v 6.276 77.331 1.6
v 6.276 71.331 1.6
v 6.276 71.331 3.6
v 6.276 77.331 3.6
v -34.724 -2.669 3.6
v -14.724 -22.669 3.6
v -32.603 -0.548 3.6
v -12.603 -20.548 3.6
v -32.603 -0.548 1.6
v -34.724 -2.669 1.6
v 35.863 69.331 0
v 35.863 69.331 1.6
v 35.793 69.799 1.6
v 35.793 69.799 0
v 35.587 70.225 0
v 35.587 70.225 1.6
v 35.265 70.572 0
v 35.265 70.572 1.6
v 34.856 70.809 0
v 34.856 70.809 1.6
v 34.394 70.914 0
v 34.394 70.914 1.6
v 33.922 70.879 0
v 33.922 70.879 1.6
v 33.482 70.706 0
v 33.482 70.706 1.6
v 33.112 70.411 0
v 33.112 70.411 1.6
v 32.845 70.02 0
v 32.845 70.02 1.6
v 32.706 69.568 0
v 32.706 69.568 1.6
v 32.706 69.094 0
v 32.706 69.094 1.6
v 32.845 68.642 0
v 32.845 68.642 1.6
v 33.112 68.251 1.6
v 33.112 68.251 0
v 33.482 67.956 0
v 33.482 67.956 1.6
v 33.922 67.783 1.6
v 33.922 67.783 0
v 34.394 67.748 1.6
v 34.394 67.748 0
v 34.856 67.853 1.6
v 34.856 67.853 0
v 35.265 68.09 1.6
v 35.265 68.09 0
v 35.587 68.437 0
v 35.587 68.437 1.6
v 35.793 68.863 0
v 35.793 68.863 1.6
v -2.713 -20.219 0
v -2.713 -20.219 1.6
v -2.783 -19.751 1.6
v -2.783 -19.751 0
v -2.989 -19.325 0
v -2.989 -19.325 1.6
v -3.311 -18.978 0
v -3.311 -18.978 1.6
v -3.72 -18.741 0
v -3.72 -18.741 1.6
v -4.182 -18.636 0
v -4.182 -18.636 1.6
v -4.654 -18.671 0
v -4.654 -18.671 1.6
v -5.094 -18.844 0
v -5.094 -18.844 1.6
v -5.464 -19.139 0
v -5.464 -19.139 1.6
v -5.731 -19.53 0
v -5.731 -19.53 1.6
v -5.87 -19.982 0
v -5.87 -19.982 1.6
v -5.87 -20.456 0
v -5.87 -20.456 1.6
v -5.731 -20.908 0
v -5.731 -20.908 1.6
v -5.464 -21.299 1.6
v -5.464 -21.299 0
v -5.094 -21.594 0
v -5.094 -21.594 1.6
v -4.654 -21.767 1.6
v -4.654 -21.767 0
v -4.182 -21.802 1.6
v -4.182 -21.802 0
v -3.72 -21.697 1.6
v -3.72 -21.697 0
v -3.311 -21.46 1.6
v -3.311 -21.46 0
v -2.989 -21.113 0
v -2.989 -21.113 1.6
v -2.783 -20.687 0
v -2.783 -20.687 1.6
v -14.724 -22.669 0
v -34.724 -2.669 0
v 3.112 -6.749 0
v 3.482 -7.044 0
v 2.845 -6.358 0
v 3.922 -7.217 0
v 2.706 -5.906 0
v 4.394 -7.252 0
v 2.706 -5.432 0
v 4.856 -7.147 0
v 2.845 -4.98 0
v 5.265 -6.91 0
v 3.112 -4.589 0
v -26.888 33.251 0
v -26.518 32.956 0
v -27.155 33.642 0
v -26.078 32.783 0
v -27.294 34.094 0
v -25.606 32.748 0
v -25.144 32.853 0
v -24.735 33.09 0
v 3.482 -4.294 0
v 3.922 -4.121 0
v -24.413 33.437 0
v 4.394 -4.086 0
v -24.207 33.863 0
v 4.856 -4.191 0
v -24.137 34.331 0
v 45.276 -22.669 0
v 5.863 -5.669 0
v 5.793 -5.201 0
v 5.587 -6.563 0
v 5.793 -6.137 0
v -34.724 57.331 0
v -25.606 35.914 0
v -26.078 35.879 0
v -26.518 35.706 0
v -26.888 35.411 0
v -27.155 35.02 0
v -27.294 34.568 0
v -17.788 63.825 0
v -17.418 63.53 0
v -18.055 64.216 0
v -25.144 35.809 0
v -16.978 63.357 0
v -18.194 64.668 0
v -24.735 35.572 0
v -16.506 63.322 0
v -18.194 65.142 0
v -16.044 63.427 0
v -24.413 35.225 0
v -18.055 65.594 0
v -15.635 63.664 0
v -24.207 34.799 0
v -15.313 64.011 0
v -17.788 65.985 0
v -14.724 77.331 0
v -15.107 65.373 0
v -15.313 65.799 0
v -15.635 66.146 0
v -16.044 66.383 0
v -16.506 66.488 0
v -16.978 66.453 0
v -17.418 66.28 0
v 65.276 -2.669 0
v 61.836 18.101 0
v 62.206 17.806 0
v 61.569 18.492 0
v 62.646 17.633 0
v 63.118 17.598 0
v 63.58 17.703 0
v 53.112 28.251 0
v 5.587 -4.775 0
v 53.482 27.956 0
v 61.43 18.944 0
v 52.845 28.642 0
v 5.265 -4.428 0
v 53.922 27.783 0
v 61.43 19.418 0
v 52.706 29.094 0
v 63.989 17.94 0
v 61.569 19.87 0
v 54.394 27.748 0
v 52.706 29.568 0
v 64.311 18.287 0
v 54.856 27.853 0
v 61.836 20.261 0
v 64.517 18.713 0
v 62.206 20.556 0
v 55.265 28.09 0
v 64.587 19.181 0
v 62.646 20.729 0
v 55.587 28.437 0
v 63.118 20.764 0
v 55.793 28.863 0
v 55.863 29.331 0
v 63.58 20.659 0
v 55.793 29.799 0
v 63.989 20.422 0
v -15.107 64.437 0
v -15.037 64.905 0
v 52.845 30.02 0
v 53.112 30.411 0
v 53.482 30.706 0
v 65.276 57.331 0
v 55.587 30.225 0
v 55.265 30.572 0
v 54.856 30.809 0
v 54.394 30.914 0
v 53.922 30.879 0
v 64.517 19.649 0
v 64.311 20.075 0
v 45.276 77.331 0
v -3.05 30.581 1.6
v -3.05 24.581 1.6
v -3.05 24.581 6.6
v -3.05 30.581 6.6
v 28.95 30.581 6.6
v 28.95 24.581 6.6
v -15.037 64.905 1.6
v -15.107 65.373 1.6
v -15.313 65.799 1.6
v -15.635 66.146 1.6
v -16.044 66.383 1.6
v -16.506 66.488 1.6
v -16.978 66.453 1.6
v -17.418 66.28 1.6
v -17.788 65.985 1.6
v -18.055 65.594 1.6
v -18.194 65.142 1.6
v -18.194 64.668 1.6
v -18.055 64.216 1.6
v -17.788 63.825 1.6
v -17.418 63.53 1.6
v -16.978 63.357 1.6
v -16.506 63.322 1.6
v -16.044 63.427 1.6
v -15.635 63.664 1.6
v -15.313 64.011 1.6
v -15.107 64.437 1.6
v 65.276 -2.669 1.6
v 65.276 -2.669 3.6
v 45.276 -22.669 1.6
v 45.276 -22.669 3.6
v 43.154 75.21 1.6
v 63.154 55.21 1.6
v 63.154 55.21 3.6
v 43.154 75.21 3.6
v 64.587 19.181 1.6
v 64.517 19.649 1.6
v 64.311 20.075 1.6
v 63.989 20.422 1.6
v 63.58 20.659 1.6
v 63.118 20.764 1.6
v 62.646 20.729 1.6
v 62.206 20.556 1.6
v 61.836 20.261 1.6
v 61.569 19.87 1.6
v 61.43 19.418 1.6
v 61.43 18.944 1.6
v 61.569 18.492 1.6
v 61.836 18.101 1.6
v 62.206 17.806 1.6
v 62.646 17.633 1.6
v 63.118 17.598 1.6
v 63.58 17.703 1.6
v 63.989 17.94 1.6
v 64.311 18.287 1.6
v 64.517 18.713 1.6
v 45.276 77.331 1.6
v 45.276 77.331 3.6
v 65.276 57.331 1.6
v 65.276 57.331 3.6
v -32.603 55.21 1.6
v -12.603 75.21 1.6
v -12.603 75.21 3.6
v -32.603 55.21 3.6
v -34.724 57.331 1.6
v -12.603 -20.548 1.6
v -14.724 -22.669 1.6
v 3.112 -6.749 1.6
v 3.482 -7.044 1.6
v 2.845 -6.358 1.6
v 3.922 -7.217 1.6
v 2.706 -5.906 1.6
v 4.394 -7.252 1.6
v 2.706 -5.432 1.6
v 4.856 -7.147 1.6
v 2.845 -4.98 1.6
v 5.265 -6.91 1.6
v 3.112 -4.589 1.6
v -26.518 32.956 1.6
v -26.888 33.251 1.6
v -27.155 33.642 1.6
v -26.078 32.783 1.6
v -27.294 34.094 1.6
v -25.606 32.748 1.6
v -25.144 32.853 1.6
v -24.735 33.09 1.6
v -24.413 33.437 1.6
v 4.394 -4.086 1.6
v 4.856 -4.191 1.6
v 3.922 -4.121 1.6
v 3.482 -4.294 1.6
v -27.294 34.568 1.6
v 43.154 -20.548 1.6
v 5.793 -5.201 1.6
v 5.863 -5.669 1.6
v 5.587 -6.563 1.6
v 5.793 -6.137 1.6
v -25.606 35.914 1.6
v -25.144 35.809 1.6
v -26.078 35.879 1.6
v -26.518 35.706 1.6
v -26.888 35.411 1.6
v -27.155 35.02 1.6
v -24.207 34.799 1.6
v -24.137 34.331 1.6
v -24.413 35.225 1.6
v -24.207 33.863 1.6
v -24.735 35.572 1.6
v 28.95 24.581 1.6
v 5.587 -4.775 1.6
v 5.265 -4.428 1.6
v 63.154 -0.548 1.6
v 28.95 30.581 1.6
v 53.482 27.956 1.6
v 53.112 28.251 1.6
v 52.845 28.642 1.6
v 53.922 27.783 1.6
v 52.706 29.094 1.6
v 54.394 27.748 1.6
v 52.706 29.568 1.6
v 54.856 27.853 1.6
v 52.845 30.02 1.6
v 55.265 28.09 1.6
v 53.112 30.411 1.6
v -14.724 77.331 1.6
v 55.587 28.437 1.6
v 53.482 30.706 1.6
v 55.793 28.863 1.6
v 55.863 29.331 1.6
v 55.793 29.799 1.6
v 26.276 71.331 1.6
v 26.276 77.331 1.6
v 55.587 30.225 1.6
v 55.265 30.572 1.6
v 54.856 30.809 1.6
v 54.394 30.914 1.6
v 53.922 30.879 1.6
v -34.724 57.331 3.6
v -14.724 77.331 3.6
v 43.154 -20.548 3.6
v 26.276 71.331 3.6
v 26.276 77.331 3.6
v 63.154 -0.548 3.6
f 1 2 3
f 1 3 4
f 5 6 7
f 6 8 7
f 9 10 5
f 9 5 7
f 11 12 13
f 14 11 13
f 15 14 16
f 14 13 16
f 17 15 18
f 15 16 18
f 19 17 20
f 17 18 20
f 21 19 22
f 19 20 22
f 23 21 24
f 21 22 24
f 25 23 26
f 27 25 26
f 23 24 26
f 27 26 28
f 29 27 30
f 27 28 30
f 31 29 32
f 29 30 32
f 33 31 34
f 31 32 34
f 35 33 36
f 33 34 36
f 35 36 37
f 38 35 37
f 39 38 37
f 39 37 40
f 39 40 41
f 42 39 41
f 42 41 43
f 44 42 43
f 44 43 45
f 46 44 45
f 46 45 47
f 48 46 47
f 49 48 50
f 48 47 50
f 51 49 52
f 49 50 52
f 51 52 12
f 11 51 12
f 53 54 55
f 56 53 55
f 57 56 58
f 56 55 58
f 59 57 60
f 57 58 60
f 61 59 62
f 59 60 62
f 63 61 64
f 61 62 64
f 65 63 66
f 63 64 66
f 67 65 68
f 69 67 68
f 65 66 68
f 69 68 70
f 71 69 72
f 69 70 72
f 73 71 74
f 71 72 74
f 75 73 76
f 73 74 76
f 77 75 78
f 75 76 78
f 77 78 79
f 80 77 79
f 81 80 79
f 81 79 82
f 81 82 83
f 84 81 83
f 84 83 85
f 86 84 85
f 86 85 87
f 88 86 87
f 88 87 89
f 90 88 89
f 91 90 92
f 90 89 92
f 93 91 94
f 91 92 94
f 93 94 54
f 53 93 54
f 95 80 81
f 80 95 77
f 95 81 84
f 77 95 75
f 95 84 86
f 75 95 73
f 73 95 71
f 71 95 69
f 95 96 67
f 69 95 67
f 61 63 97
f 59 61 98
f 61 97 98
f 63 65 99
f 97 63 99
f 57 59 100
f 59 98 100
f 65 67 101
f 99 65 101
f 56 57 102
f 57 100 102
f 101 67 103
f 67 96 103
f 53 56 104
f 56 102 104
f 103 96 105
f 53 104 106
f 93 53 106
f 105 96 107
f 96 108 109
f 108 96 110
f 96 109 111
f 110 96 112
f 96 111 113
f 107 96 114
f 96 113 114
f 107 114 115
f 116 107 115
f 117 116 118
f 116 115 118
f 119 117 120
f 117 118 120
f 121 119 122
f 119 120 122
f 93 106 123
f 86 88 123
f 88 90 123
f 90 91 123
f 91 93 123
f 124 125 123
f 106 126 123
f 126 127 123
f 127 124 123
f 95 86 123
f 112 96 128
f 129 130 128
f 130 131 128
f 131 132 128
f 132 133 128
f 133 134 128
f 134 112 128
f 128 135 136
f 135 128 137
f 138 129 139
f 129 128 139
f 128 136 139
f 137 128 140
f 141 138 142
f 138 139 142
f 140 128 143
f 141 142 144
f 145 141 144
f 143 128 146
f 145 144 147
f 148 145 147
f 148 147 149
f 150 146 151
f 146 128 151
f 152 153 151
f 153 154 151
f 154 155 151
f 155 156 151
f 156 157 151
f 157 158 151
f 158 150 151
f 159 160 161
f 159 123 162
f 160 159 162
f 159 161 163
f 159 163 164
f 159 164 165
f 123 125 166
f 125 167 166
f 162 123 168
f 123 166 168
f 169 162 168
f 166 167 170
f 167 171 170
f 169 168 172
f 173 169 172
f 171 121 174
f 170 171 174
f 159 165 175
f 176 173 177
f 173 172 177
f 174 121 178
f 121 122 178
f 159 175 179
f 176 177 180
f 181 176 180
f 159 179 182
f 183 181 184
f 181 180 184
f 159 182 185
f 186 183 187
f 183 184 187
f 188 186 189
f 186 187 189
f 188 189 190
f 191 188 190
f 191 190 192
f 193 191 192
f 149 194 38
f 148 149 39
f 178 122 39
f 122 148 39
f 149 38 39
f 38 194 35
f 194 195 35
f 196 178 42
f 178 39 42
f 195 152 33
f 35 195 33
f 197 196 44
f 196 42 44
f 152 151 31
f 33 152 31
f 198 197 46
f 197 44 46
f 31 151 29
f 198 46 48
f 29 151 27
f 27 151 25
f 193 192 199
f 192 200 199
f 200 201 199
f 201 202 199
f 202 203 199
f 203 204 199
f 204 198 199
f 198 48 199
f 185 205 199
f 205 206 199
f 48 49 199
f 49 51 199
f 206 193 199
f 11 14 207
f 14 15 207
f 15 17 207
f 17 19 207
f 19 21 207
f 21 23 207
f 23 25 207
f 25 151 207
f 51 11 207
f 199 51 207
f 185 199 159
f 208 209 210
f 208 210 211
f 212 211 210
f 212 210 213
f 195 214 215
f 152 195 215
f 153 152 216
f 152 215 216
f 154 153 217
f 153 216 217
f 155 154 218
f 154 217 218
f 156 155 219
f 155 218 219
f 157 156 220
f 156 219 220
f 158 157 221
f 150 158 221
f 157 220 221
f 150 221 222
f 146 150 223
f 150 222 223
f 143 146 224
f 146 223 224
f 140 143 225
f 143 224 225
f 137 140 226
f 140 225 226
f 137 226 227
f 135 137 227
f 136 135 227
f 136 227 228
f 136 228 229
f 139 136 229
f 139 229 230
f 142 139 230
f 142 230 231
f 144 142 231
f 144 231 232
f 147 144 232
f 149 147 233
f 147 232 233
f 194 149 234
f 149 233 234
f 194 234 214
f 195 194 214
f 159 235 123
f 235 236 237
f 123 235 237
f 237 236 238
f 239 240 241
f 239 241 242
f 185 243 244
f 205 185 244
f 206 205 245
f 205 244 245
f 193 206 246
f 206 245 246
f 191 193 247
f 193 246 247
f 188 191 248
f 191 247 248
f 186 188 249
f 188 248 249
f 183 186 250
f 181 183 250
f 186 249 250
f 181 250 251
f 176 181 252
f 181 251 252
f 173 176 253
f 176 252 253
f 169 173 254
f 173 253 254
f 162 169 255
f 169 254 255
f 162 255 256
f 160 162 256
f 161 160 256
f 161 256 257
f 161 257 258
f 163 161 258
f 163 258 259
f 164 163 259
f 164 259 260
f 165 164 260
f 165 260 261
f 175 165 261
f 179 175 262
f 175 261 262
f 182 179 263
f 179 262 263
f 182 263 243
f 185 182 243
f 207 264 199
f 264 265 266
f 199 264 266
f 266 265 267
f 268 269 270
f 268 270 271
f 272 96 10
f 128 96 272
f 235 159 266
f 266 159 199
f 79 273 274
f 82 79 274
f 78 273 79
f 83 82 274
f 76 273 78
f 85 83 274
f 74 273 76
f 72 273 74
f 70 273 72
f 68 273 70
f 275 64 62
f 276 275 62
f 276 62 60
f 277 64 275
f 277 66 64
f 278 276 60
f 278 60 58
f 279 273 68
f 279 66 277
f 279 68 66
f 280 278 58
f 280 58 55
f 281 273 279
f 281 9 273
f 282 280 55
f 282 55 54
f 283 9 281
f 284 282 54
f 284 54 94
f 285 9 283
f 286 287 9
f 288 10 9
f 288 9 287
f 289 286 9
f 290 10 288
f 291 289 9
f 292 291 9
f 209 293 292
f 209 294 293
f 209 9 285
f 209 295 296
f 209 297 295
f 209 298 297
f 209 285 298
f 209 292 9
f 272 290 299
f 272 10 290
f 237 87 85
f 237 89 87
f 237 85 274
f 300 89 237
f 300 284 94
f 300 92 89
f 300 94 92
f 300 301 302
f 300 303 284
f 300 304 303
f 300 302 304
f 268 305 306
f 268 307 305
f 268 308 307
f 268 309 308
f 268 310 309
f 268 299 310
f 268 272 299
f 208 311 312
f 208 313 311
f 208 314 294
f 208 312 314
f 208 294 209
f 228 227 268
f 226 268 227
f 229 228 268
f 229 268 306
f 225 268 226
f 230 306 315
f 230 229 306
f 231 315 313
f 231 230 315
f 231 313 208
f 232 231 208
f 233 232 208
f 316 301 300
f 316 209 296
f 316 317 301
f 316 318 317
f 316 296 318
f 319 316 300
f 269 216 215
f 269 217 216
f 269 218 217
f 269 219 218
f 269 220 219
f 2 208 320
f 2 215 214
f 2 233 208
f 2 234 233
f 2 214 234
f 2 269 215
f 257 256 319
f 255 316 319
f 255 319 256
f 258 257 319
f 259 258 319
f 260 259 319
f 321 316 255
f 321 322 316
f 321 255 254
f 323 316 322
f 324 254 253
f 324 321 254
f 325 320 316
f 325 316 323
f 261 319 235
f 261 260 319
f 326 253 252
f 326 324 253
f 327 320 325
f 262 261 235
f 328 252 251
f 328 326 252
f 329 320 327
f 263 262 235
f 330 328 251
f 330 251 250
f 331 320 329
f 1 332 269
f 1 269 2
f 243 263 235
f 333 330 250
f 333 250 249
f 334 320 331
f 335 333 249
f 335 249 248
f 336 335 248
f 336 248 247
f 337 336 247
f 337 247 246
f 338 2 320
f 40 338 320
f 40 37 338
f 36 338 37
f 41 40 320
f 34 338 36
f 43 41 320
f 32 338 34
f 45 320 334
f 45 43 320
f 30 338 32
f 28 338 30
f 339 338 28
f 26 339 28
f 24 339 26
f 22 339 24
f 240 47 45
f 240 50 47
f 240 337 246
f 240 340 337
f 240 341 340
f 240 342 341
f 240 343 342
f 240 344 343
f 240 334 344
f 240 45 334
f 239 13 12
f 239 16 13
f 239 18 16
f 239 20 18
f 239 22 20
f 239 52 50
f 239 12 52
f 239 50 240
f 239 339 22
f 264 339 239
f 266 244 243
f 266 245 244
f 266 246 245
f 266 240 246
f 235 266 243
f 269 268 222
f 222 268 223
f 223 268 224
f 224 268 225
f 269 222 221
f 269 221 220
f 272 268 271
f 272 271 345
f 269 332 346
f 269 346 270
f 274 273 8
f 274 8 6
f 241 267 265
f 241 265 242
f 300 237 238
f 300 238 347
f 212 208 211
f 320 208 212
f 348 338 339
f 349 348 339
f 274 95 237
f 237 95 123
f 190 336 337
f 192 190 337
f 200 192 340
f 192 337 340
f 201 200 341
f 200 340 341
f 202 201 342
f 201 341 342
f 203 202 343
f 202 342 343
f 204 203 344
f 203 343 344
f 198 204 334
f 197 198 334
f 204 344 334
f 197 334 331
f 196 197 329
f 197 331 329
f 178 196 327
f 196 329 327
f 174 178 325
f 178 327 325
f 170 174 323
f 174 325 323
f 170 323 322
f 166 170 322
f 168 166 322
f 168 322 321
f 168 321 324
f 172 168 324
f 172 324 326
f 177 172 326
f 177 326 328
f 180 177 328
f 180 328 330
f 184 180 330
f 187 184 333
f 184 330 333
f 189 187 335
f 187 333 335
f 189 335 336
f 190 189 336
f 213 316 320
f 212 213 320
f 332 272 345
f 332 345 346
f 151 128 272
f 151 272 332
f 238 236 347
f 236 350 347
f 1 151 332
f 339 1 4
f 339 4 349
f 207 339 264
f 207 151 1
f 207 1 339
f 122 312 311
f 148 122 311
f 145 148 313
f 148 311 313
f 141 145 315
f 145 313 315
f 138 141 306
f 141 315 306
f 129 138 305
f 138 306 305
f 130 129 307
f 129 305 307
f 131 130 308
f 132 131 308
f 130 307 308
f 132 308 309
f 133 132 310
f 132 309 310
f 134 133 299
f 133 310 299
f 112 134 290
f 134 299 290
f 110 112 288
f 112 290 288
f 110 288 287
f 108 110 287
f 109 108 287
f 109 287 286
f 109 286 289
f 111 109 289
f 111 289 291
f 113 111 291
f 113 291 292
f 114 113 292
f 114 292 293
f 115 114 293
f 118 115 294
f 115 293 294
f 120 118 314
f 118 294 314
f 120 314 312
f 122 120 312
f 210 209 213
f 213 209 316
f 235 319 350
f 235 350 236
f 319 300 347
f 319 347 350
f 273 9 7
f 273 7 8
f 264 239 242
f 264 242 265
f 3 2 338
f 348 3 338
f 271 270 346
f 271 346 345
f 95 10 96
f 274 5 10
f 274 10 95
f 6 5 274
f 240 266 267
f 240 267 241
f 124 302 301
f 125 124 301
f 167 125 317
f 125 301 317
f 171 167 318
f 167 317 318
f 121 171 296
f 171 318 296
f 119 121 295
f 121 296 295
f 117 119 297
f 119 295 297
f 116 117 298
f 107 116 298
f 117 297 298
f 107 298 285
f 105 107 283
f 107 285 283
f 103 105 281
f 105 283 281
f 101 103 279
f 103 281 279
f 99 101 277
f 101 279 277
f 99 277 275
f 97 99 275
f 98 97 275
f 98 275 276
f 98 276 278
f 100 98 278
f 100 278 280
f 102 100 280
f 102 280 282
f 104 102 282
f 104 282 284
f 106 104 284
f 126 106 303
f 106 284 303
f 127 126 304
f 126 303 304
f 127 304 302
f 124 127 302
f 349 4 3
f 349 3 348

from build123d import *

# Parameters (mm, degrees)
SKETCH1_W           = 100
SKETCH1_H           = 100
BOSS_EXTRUDE1_DEPTH = 1.6
CUT_EXTRUDE1_DEPTH  = 1.6
SKETCH7_R           = 1.5875
CUT_EXTRUDE2_DEPTH  = 1.6
SKETCH8_W           = 32
SKETCH8_H           = 6
BOSS_EXTRUDE2_DEPTH = 5
BOSS_EXTRUDE3_DEPTH = 2
SKETCH12_W          = 20
SKETCH12_H          = 6
BOSS_EXTRUDE5_DEPTH = 2


with BuildPart() as part:
    # Sketch1 → Boss-Extrude1 (new body)
    with BuildSketch(Plane.XY):
        with Locations((15.275668243, 27.330907947)):
            Rectangle(SKETCH1_W, SKETCH1_H)
    extrude(amount=BOSS_EXTRUDE1_DEPTH)

    # Sketch2 → Cut-Extrude1 (cut)
    with BuildSketch(Plane.XY.offset(1.6)):
        Polygon((-34.724331757, 57.330907947), (-14.724331757, 77.330907947), (-34.724331757, 77.330907947), align=None)
        Polygon((-34.724331757, -2.669092053), (-14.724331757, -22.669092053), (-34.724331757, -22.669092053), align=None)
        Polygon((45.275668243, 77.330907947), (65.275668243, 57.330907947), (65.275668243, 77.330907947), align=None)
        Polygon((65.275668243, -2.669092053), (45.275668243, -22.669092053), (65.275668243, -22.669092053), align=None)
    extrude(amount=-CUT_EXTRUDE1_DEPTH, mode=Mode.SUBTRACT)

    # Sketch7 → Cut-Extrude2 (cut)
    with BuildSketch(Plane.XY.offset(1.6)):
        with Locations((-25.724331757, 34.330907947)):
            Circle(SKETCH7_R)
        with Locations((-16.624331757, 64.904907947)):
            Circle(SKETCH7_R)
        with Locations((34.275668243, 69.330907947)):
            Circle(SKETCH7_R)
        with Locations((54.275668243, 29.330907947)):
            Circle(SKETCH7_R)
        with Locations((62.999668243, 19.180907947)):
            Circle(SKETCH7_R)
        with Locations((-4.300331757, -20.219092053)):
            Circle(SKETCH7_R)
        with Locations((4.275668243, -5.669092053)):
            Circle(SKETCH7_R)
    extrude(amount=-CUT_EXTRUDE2_DEPTH, mode=Mode.SUBTRACT)

    # Sketch8 → Boss-Extrude2 (add)
    with BuildSketch(Plane.XY.offset(1.6)):
        with Locations((12.949668243, 27.580907947)):
            Rectangle(SKETCH8_W, SKETCH8_H)
    extrude(amount=BOSS_EXTRUDE2_DEPTH)

    # Sketch10 → Boss-Extrude3 (add)
    with BuildSketch(Plane.XY.offset(1.6)):
        Polygon((-34.724331757, 57.330907947), (-14.724331757, 77.330907947), (-12.603011413, 75.209587604), (-32.603011413, 55.209587604), align=None)
        Polygon((45.275668243, 77.330907947), (65.275668243, 57.330907947), (63.154347899, 55.209587604), (43.154347899, 75.209587604), align=None)
        Polygon((65.275668243, -2.669092053), (45.275668243, -22.669092053), (43.154347899, -20.547771709), (63.154347899, -0.547771709), align=None)
        Polygon((-14.724331757, -22.669092053), (-34.724331757, -2.669092053), (-32.603011413, -0.547771709), (-12.603011413, -20.547771709), align=None)
    extrude(amount=BOSS_EXTRUDE3_DEPTH)

    # Sketch12 → Boss-Extrude5 (add)
    with BuildSketch(Plane.XY.offset(1.6)):
        with Locations((16.275668243, 74.330907947)):
            Rectangle(SKETCH12_W, SKETCH12_H)
    extrude(amount=BOSS_EXTRUDE5_DEPTH)


solid = part.part
